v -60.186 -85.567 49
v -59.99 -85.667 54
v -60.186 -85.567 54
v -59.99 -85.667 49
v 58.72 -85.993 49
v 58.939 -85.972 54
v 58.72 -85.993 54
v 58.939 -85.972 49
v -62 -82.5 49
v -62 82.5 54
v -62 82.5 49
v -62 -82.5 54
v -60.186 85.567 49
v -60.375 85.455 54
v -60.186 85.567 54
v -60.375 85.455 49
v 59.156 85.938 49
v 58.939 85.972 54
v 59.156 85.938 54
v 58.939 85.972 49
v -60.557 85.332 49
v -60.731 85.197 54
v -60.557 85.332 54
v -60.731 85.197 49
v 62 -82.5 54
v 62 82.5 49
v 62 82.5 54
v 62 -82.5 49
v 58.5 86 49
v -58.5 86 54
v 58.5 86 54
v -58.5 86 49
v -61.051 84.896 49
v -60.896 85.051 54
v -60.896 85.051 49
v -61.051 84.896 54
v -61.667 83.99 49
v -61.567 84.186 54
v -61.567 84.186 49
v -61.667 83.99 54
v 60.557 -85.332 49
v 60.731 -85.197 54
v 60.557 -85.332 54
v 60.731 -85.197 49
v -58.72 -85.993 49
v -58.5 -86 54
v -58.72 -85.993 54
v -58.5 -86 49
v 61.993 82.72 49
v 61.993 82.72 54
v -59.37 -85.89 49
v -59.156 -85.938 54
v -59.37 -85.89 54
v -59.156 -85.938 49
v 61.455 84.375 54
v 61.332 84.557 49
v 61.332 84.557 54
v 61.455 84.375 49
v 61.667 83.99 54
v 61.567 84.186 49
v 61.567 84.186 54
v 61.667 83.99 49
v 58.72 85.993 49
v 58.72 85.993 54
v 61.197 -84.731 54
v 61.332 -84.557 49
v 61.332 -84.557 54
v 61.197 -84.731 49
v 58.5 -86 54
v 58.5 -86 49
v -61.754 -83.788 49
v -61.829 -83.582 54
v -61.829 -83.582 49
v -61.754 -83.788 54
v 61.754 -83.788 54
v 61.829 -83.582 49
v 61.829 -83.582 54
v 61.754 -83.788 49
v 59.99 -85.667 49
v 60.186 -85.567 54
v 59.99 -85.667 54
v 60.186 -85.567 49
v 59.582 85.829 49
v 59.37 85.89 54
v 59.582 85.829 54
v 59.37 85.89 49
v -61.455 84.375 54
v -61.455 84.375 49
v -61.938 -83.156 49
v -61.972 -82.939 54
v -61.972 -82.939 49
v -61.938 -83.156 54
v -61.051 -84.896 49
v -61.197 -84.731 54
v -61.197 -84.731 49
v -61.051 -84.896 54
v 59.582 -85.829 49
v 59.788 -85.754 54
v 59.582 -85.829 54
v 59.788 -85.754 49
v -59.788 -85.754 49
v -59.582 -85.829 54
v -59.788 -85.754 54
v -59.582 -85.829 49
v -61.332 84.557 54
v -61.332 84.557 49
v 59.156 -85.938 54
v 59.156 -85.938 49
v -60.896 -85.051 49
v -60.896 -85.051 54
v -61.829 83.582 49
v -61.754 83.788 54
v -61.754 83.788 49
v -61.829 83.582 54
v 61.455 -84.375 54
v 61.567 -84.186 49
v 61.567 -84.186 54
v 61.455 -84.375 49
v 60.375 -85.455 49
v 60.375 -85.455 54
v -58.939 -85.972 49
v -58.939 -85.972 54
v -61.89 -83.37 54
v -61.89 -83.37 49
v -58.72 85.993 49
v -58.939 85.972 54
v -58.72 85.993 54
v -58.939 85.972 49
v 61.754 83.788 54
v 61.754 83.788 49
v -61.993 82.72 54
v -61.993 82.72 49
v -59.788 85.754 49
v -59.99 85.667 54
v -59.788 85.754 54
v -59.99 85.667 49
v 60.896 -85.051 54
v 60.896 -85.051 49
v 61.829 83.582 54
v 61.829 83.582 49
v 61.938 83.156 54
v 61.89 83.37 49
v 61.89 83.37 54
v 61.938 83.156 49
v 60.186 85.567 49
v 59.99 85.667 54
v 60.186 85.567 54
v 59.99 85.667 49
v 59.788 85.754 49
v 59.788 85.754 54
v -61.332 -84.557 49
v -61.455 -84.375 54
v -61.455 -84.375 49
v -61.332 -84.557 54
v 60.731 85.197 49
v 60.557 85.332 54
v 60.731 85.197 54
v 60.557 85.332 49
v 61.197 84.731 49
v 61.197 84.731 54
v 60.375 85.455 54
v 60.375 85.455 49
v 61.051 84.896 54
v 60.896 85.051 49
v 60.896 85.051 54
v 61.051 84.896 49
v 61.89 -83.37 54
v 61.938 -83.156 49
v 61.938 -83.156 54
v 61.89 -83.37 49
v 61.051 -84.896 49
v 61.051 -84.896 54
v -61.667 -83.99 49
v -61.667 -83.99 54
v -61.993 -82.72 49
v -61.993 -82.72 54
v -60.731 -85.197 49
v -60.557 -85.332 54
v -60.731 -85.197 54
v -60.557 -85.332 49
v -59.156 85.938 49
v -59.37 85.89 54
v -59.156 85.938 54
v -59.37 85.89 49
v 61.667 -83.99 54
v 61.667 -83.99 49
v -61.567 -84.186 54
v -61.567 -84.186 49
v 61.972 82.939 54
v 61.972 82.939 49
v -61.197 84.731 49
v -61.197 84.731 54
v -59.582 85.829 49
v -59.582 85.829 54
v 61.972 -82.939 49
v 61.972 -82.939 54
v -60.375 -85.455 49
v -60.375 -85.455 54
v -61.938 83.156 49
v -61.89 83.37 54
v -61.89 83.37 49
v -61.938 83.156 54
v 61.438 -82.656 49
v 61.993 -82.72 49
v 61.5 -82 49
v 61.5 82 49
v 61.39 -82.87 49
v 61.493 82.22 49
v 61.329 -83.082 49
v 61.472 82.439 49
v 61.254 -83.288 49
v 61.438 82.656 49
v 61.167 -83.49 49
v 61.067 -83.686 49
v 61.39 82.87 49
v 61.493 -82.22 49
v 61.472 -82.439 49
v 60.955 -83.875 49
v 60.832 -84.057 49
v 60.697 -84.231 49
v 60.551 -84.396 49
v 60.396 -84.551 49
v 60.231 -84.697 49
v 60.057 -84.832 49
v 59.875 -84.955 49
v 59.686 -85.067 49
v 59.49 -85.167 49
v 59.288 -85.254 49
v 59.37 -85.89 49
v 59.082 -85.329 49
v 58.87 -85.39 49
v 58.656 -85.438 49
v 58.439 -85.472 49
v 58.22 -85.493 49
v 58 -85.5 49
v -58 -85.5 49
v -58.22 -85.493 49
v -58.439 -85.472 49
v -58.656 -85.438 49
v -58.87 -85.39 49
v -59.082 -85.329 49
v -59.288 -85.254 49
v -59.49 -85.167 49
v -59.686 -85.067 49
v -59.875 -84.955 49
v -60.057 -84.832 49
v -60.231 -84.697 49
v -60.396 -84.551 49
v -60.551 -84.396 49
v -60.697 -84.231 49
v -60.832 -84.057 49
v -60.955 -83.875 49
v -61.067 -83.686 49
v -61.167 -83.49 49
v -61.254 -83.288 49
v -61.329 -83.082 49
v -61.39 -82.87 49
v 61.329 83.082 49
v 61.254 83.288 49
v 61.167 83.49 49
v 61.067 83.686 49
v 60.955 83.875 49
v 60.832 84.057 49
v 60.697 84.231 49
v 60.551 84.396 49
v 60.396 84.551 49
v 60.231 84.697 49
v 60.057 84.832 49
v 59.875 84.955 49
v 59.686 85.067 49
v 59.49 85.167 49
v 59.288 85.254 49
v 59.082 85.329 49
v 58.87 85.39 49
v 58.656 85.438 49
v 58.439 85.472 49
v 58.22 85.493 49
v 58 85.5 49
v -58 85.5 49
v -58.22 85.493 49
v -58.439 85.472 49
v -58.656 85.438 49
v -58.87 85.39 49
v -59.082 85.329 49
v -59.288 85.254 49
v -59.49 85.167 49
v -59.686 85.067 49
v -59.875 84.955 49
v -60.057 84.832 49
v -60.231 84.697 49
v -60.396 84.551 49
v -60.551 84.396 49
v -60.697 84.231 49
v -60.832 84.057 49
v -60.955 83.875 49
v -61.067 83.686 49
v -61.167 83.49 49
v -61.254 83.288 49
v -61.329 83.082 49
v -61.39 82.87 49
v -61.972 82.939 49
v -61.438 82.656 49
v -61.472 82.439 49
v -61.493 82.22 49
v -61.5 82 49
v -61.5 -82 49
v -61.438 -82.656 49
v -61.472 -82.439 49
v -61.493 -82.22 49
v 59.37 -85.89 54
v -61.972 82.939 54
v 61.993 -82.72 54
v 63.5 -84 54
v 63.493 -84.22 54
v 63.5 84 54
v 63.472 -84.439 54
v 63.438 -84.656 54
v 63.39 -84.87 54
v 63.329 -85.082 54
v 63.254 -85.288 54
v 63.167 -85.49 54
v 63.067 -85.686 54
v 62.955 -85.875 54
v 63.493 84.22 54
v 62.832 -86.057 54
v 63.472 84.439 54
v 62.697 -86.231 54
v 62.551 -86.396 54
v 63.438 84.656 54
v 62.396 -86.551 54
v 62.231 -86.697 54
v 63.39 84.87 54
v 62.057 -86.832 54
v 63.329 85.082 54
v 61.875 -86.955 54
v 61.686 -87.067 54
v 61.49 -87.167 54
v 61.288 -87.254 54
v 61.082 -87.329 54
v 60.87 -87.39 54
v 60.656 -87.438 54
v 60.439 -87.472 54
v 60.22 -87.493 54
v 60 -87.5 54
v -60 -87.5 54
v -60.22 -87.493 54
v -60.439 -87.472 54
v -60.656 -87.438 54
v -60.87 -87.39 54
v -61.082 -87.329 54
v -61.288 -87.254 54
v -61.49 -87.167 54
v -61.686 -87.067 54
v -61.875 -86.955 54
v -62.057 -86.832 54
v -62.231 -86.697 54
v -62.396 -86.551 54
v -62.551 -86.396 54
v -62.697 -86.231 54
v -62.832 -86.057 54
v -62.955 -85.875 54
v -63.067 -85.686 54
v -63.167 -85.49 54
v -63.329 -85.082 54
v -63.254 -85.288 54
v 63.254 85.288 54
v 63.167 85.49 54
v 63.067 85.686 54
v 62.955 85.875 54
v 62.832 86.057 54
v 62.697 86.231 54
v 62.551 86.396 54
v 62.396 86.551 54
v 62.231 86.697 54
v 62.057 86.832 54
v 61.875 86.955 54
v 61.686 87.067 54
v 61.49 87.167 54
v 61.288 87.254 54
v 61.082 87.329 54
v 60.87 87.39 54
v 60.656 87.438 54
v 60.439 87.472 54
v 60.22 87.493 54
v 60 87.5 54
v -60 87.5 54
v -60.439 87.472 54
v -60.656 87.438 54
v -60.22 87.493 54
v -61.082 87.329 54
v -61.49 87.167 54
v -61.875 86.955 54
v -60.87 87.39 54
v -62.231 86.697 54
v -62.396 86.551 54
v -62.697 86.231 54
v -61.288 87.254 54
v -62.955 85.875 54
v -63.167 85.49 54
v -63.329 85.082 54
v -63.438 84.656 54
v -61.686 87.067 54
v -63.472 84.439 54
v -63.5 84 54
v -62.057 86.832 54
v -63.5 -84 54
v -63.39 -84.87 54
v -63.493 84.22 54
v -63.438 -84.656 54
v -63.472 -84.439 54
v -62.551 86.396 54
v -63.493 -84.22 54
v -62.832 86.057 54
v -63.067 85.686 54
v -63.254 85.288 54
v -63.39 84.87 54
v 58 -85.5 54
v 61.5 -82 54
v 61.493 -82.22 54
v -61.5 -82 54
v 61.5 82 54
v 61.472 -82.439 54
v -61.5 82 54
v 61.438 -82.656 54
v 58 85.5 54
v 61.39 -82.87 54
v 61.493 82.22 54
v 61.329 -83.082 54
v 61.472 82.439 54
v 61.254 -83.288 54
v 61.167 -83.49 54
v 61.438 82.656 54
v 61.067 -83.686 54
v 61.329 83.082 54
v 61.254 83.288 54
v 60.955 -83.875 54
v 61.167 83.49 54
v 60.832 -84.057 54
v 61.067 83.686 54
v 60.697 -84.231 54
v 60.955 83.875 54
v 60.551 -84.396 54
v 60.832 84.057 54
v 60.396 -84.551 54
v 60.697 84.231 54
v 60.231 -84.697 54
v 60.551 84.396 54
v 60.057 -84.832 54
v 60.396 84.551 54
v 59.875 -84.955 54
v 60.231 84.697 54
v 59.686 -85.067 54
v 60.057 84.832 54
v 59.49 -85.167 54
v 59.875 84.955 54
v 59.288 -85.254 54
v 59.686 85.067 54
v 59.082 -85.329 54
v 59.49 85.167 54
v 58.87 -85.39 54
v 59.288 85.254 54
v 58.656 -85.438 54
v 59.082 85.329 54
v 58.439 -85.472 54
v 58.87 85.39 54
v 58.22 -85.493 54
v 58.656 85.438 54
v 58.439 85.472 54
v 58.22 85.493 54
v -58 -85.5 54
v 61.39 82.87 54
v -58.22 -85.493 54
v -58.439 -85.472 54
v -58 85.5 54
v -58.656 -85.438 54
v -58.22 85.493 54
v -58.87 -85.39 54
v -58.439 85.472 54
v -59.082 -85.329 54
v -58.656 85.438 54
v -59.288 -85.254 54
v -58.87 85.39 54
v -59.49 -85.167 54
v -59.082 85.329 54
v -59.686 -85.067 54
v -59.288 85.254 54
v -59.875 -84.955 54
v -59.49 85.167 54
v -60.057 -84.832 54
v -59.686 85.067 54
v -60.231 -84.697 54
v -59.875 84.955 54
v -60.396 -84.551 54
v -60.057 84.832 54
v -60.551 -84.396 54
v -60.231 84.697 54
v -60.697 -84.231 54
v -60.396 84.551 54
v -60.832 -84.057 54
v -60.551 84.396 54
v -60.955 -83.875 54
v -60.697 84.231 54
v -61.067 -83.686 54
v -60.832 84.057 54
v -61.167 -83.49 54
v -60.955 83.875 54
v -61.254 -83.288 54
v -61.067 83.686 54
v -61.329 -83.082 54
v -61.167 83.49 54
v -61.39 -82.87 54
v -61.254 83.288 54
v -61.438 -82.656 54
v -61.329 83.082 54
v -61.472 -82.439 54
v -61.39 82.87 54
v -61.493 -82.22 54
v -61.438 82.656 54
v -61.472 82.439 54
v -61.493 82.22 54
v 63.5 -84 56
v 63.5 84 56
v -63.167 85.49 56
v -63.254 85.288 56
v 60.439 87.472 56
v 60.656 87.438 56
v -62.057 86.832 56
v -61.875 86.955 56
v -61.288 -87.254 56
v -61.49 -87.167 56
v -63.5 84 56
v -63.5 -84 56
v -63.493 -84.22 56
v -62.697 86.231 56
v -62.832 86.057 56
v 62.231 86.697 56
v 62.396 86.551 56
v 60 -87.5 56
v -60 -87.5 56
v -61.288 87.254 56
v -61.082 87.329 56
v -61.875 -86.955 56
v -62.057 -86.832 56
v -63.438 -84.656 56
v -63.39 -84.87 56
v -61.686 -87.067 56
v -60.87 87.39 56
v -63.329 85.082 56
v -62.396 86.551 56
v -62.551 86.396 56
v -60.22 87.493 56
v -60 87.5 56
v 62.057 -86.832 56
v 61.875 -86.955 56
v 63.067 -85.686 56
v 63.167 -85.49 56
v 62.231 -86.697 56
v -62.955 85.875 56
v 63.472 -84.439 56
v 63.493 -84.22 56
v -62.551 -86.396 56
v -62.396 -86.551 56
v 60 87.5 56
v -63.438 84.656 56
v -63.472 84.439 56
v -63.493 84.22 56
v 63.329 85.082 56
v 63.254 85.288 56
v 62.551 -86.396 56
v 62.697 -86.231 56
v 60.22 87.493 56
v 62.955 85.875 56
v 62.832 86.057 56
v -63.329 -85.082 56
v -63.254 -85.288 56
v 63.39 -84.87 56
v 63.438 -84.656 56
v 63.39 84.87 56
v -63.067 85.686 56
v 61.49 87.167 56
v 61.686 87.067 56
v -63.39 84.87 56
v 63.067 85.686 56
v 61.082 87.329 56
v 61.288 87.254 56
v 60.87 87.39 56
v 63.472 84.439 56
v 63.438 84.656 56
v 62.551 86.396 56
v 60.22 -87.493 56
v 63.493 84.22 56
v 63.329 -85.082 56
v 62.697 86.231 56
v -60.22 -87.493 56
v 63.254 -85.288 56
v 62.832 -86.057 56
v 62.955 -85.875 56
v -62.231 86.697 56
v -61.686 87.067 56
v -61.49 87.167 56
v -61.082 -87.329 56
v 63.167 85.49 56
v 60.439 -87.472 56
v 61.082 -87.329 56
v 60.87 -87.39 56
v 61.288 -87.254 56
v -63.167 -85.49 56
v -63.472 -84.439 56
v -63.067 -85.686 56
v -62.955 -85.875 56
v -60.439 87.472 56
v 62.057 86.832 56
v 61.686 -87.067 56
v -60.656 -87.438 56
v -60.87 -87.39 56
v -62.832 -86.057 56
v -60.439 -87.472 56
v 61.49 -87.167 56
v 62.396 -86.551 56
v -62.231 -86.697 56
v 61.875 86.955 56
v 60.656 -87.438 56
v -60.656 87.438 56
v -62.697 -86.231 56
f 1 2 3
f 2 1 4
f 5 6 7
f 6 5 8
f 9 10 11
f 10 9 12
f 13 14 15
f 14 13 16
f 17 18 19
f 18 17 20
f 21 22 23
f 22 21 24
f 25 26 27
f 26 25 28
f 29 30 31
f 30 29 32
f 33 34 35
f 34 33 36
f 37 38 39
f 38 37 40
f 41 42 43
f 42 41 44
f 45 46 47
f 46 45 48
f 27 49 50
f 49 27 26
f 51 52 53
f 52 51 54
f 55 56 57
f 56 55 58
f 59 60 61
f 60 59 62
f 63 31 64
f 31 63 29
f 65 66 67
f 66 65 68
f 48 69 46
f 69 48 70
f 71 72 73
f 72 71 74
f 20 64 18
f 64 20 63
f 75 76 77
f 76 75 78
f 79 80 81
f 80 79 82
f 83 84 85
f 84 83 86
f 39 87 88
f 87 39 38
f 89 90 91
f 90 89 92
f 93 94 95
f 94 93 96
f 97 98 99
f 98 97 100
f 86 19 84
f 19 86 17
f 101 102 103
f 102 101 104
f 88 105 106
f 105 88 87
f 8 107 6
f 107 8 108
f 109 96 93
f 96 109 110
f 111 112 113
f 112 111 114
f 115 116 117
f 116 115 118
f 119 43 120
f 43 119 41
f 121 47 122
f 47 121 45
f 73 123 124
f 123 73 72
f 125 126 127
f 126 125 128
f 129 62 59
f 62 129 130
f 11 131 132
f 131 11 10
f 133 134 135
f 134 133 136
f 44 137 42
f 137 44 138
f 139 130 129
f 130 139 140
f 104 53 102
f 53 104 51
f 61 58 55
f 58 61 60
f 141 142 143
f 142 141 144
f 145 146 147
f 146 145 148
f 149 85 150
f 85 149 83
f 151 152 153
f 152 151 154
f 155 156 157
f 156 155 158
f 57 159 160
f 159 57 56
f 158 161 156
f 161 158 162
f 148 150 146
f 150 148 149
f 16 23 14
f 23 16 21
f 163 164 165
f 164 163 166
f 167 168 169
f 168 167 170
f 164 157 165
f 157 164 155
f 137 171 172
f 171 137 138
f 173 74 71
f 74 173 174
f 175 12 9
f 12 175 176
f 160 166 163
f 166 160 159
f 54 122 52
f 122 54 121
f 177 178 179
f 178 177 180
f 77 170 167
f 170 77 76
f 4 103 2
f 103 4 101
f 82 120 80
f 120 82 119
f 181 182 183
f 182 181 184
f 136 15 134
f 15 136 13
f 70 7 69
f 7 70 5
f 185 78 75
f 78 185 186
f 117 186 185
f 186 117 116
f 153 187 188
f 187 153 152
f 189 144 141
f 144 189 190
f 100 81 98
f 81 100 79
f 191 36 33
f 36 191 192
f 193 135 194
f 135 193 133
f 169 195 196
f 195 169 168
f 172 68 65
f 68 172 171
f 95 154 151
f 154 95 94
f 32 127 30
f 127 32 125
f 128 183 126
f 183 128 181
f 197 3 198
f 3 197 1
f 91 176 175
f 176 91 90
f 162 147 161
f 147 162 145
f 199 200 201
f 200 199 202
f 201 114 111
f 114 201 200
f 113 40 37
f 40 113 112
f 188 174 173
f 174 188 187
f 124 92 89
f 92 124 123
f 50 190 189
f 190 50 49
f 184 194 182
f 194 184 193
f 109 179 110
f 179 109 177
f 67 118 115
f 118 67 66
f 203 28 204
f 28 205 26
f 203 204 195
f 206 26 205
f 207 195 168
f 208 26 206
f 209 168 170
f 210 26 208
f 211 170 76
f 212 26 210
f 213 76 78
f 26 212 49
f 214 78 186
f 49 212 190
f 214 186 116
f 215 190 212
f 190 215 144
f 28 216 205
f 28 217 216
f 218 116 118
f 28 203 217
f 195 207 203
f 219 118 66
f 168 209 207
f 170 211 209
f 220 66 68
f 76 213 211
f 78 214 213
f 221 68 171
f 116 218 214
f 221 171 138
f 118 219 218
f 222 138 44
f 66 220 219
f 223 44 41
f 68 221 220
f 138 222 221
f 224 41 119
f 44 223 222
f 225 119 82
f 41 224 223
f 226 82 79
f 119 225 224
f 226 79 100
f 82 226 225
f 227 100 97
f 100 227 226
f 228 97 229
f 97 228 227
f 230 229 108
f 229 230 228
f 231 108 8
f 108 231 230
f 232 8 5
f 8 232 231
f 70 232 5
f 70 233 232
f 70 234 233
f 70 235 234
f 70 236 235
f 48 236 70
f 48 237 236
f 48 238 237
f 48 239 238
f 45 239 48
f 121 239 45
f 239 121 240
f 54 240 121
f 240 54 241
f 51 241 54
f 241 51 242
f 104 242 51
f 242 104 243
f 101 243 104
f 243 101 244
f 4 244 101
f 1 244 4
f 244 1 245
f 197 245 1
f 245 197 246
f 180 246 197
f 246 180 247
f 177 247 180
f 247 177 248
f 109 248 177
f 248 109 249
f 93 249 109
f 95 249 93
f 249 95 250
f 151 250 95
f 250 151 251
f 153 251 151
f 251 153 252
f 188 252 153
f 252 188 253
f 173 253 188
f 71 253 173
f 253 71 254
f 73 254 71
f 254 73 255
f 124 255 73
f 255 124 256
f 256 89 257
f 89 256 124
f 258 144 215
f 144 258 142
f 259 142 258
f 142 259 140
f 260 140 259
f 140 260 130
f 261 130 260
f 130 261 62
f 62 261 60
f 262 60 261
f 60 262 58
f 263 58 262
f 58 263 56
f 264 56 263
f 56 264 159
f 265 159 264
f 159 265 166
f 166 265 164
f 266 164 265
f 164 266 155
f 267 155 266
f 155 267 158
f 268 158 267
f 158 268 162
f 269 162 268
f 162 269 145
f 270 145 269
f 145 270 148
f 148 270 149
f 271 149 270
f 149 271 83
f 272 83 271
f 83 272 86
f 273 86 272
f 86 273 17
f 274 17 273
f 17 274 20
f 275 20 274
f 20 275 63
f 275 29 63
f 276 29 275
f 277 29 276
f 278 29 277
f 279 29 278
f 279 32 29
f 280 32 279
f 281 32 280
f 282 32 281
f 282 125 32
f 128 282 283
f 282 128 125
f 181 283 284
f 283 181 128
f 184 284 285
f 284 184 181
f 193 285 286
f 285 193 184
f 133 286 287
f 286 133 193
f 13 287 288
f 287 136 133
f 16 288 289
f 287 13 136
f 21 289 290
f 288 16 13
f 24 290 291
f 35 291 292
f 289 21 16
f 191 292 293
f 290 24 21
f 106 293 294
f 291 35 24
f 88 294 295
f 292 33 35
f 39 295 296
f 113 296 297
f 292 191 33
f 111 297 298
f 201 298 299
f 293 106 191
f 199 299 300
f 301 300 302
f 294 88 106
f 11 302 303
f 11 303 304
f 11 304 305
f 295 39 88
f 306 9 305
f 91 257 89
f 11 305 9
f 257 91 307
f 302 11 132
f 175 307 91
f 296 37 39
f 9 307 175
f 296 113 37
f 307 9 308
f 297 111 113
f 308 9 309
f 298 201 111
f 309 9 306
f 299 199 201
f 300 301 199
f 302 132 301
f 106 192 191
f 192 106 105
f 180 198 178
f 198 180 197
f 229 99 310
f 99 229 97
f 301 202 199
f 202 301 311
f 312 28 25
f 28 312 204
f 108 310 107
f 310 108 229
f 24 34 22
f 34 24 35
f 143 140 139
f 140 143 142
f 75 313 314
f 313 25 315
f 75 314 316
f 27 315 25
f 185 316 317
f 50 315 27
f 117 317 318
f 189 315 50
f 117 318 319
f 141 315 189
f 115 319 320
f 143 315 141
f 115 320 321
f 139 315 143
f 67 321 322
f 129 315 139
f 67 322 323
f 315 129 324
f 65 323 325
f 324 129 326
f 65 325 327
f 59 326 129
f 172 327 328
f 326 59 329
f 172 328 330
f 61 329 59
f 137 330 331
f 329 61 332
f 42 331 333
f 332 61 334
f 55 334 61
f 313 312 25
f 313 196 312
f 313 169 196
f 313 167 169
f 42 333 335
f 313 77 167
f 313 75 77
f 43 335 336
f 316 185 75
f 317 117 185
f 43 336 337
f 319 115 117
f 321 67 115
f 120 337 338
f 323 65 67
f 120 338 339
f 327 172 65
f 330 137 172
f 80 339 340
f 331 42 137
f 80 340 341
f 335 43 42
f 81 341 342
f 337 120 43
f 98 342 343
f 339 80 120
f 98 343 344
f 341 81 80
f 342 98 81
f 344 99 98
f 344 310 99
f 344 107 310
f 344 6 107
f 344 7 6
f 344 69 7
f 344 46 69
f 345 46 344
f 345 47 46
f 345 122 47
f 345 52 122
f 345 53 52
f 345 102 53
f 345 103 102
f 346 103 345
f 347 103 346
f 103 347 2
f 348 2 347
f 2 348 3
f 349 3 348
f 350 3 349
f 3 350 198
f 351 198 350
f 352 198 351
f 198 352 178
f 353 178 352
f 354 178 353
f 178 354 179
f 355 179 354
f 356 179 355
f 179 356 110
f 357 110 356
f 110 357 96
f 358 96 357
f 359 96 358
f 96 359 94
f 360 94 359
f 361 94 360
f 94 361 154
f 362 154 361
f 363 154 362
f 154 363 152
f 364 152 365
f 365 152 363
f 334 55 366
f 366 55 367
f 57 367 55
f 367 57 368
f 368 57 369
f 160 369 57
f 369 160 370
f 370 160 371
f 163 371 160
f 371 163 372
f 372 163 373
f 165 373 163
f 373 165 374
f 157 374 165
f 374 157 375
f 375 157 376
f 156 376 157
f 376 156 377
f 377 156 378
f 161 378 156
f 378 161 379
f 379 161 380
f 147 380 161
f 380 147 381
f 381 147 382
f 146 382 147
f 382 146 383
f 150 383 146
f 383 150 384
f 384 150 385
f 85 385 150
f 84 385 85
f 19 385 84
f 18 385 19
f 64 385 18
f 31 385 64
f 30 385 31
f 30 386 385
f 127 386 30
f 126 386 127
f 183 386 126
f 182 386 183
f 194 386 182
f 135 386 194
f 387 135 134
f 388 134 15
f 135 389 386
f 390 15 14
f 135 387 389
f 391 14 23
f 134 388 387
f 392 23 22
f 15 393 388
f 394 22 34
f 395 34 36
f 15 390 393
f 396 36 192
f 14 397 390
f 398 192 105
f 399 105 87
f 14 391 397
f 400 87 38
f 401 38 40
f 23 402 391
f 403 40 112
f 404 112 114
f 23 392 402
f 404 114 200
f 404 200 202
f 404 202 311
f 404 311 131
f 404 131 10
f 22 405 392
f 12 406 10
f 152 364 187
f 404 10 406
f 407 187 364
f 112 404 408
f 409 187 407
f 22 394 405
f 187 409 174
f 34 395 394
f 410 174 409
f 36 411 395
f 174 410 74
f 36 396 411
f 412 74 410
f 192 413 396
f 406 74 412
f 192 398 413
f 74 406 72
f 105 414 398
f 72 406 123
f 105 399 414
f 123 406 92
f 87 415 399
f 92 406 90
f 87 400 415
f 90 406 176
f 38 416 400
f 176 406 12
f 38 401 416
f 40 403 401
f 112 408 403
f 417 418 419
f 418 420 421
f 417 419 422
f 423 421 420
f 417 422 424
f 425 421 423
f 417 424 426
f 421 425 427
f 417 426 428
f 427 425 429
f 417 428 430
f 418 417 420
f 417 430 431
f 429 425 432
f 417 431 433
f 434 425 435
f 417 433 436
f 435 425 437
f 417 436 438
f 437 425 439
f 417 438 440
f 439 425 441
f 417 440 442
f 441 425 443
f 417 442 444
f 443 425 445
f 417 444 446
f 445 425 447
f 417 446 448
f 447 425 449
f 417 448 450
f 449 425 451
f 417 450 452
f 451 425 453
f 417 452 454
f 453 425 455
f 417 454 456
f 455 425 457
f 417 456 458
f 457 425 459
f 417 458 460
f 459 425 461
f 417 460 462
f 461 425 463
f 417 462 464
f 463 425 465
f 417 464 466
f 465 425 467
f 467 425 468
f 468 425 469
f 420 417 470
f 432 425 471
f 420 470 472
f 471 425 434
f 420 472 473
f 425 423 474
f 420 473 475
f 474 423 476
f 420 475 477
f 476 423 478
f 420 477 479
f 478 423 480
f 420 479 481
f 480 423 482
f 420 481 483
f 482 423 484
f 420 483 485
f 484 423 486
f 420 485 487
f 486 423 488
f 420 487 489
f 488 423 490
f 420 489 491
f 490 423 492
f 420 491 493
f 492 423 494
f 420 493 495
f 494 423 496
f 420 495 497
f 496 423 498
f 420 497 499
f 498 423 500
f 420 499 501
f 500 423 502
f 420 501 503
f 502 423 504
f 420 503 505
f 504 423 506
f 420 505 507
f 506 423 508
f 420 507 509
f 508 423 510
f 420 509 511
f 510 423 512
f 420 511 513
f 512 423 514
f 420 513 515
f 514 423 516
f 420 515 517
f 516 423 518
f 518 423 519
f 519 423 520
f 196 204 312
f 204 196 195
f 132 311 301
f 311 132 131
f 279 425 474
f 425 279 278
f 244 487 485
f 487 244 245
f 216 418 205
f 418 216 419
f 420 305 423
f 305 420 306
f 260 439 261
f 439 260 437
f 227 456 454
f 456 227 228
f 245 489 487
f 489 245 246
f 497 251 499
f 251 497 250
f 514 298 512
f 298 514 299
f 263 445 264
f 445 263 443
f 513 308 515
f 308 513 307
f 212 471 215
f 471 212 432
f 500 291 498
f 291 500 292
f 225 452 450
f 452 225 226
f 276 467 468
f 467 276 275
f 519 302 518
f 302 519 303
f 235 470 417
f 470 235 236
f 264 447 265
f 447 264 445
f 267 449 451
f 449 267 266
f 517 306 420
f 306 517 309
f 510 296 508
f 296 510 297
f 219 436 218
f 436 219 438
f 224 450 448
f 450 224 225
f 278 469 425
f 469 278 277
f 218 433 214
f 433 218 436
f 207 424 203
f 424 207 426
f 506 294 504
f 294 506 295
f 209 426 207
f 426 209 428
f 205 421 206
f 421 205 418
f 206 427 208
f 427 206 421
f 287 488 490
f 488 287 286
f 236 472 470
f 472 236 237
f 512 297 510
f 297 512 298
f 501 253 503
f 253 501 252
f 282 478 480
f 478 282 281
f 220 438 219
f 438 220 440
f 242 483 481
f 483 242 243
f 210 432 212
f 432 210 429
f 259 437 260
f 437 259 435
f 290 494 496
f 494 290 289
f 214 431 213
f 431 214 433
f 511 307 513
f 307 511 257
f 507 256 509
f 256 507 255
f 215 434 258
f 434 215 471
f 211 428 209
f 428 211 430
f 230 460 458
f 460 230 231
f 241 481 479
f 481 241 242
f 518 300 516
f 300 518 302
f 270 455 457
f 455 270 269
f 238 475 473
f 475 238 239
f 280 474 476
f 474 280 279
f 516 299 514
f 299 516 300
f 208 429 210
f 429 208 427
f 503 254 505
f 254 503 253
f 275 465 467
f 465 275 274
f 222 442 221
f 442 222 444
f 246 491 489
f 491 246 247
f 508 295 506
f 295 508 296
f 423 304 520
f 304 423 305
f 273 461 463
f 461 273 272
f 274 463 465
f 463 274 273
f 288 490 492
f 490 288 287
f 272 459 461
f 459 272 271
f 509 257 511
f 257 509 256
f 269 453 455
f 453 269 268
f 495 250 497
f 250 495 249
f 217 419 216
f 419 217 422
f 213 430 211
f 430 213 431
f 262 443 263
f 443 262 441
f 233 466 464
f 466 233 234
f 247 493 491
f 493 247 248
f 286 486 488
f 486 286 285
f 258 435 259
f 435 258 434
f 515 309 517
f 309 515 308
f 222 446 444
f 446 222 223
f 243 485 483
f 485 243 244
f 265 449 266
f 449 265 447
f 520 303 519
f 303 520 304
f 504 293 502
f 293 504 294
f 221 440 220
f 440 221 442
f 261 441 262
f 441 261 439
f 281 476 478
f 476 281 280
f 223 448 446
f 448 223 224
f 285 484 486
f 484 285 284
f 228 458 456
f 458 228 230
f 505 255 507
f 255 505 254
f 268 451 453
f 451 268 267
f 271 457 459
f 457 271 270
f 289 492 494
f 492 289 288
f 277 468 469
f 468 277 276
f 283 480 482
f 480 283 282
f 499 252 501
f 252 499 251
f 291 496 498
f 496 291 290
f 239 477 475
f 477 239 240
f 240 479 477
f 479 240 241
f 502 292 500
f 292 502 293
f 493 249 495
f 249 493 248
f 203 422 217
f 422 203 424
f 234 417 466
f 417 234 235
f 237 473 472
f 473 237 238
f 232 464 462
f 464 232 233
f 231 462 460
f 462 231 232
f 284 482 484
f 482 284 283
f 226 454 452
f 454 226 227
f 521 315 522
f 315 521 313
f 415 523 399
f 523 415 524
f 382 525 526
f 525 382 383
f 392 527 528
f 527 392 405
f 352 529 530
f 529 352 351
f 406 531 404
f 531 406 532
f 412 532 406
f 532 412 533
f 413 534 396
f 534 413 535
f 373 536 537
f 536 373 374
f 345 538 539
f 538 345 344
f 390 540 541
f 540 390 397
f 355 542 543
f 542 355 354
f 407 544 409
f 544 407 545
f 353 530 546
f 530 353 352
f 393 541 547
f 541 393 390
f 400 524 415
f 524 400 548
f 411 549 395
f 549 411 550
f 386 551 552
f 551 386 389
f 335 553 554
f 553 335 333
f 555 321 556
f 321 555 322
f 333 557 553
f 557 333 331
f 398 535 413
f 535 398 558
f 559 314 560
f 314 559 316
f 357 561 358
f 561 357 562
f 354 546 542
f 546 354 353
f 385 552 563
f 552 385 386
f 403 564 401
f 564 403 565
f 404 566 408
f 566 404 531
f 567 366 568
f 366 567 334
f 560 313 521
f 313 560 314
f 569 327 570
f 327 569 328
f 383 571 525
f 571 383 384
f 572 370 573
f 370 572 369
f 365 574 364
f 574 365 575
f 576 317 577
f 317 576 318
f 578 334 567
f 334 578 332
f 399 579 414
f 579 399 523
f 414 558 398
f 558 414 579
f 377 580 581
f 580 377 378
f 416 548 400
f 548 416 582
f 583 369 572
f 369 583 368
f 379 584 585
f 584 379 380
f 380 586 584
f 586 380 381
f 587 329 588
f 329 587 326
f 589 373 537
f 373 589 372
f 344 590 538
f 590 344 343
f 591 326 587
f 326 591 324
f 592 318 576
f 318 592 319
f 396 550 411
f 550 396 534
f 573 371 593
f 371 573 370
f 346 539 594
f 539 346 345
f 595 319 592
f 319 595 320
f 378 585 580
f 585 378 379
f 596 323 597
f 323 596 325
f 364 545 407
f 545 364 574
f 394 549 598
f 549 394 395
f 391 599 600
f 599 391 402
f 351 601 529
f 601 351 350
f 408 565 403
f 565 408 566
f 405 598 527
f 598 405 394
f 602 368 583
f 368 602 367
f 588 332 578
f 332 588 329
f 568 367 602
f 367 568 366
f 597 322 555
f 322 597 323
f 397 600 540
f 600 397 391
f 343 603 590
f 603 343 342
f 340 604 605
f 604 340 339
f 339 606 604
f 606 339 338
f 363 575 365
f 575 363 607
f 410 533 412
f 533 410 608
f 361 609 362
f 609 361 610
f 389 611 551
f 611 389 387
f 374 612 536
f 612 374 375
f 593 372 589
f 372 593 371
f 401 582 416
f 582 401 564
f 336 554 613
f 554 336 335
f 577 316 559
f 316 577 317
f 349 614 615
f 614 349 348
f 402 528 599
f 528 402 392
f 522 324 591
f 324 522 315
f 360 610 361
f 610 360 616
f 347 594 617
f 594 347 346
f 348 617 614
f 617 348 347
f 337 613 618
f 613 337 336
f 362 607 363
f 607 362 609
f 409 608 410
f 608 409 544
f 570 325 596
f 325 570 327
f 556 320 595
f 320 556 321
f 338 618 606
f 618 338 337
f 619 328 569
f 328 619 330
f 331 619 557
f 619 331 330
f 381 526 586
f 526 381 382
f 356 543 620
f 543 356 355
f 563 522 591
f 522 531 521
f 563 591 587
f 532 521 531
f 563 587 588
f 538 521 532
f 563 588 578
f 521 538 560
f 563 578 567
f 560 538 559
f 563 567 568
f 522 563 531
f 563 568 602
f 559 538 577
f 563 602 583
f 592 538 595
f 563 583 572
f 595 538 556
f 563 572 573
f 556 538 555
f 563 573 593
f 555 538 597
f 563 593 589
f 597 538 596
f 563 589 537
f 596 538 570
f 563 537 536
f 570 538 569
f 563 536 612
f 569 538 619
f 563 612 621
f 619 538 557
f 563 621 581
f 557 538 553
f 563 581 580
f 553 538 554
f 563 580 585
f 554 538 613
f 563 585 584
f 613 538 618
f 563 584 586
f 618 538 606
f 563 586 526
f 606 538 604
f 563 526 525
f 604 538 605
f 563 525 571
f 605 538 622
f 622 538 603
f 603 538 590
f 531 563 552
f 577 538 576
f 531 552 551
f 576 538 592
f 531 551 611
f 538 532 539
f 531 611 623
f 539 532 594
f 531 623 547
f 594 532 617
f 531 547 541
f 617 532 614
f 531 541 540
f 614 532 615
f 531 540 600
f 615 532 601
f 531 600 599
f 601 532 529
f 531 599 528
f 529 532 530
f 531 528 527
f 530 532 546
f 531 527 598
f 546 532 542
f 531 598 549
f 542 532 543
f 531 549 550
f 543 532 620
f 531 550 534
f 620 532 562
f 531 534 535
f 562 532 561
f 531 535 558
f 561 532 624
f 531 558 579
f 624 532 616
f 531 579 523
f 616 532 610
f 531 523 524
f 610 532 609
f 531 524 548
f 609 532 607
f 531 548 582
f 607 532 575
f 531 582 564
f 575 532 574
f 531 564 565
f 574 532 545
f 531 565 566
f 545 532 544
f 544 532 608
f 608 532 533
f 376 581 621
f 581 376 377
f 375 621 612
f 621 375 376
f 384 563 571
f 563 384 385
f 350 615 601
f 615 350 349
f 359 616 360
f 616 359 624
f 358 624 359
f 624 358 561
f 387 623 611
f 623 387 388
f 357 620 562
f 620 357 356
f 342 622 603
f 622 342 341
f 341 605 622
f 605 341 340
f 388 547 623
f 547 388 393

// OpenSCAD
$fa = 1;
$fs = 0.4;
$fn = 100;

/* Global vars */
corner_diameter = 7.00;

num_pacifiers = 4;
pacifier_x_spacing = 12.00*2; // * 2 bcz Jennifer
pacifier_y_spacing = 20.00*2; // * 2 bcz Jennifer
pacifier_diameter = 27.00;
pacifier_insert_height = 13.5;

pacifier_insert_thickness = 2.00; // Not needed?
pacifier_rows = 2;

shell_thickness = 1.00;
lid_thickness = 2.00;
lid_overlap = 5.00;
lid_spacing = 1.00;

/* Hole matrix */
num_cols = num_pacifiers/pacifier_rows;
pacifier_holes_witdh = num_cols*(pacifier_diameter) + (num_cols-1)*pacifier_x_spacing;

pacifier_holes_height = pacifier_rows * pacifier_diameter + (pacifier_rows-1) * pacifier_y_spacing;

/* Box Vars */
w2 = pacifier_holes_witdh/2+pacifier_x_spacing-corner_diameter/2+shell_thickness/2;
h2 = pacifier_holes_height/2+pacifier_y_spacing-corner_diameter/2+shell_thickness/2;
box_height = pacifier_insert_height*4;

ww2 = w2-shell_thickness/2;
hh2 = h2-shell_thickness/2;
www2 = ww2-lid_spacing;
hhh2 = hh2-lid_spacing;
ccorner_diameter = corner_diameter;

module pacifier_slots() {
    for (i = [0:pacifier_rows-1])
    {
        for (j = [0:(num_pacifiers/pacifier_rows)-1])
        {
            num_cols = num_pacifiers/pacifier_rows;
            x_coord = -pacifier_holes_witdh/2 + pacifier_diameter/2 + j*(pacifier_x_spacing+pacifier_diameter);
            tot_height = pacifier_rows * pacifier_diameter + (pacifier_rows-1) * pacifier_y_spacing;
            y_coord = -pacifier_holes_height/2 + pacifier_diameter/2 + i*(pacifier_y_spacing+pacifier_diameter);
            translate([x_coord, y_coord]) cylinder(d=pacifier_diameter, h=pacifier_insert_height*2);
        }
    }
}

module box_shell() {
    difference () {
        hull () {
            translate([-w2, -h2]) cylinder(d=corner_diameter, h=box_height);
            translate([w2, -h2]) cylinder(d=corner_diameter, h=box_height);
            translate([w2, h2]) cylinder(d=corner_diameter, h=box_height);
            translate([-w2, h2]) cylinder(d=corner_diameter, h=box_height);
        }

        translate([0, 0, shell_thickness]) hull () {
            translate([-ww2, -hh2]) cylinder(d=ccorner_diameter, h=box_height);
            translate([ww2, -hh2]) cylinder(d=ccorner_diameter, h=box_height);
            translate([ww2, hh2]) cylinder(d=ccorner_diameter, h=box_height);
            translate([-ww2, hh2]) cylinder(d=ccorner_diameter, h=box_height);
        }
    }
}

module box_lid () {
    union() {
        translate([0, 0, box_height]) hull () {
            translate([-w2, -h2]) cylinder(d=ccorner_diameter, h=lid_thickness);
            translate([w2, -h2]) cylinder(d=ccorner_diameter, h=lid_thickness);
            translate([w2, h2]) cylinder(d=ccorner_diameter, h=lid_thickness);
            translate([-w2, h2]) cylinder(d=ccorner_diameter, h=lid_thickness);
        }
        difference() {
            translate([0, 0, box_height-lid_overlap]) hull () {
                translate([-www2, -hhh2]) cylinder(d=ccorner_diameter, h=lid_overlap);
                translate([www2, -hhh2]) cylinder(d=ccorner_diameter, h=lid_overlap);
                translate([www2, hhh2]) cylinder(d=ccorner_diameter, h=lid_overlap);
                translate([-www2, hhh2]) cylinder(d=ccorner_diameter, h=lid_overlap);
            }
            wwww2 = www2-shell_thickness/2;
            hhhh2 = hhh2-shell_thickness/2;
            translate([0, 0, box_height-lid_overlap*2]) hull () {
                translate([-wwww2, -hhhh2]) cylinder(d=ccorner_diameter, h=lid_overlap*2);
                translate([wwww2, -hhhh2]) cylinder(d=ccorner_diameter, h=lid_overlap*2);
                translate([wwww2, hhhh2]) cylinder(d=ccorner_diameter, h=lid_overlap*2);
                translate([-wwww2, hhhh2]) cylinder(d=ccorner_diameter, h=lid_overlap*2);
            }
        }
    }
}

module insert () {
    difference() {
        _ww2 = ww2 - lid_spacing;
        _hh2 = hh2 - lid_spacing;
        translate([0, 0, shell_thickness]) hull () {
            translate([-_ww2, -_hh2]) cylinder(d=ccorner_diameter, h=pacifier_insert_height);
            translate([_ww2, -_hh2]) cylinder(d=ccorner_diameter, h=pacifier_insert_height);
            translate([_ww2, _hh2]) cylinder(d=ccorner_diameter, h=pacifier_insert_height);
            translate([-_ww2, _hh2]) cylinder(d=ccorner_diameter, h=pacifier_insert_height);
        }
        pacifier_slots();
        _www2 = _ww2 - shell_thickness;
        _hhh2 = _hh2 - shell_thickness;
        translate([0, 0, 0]) hull () {
            translate([-_www2, -_hhh2]) cylinder(d=ccorner_diameter, h=pacifier_insert_height);
            translate([_www2, -_hhh2]) cylinder(d=ccorner_diameter, h=pacifier_insert_height);
            translate([_www2, _hhh2]) cylinder(d=ccorner_diameter, h=pacifier_insert_height);
            translate([-_www2, _hhh2]) cylinder(d=ccorner_diameter, h=pacifier_insert_height);
        }
    }
}

//color("orange") box_shell();
//color("blue") insert();
color("red") box_lid();

//color("green") pacifier_slots();
